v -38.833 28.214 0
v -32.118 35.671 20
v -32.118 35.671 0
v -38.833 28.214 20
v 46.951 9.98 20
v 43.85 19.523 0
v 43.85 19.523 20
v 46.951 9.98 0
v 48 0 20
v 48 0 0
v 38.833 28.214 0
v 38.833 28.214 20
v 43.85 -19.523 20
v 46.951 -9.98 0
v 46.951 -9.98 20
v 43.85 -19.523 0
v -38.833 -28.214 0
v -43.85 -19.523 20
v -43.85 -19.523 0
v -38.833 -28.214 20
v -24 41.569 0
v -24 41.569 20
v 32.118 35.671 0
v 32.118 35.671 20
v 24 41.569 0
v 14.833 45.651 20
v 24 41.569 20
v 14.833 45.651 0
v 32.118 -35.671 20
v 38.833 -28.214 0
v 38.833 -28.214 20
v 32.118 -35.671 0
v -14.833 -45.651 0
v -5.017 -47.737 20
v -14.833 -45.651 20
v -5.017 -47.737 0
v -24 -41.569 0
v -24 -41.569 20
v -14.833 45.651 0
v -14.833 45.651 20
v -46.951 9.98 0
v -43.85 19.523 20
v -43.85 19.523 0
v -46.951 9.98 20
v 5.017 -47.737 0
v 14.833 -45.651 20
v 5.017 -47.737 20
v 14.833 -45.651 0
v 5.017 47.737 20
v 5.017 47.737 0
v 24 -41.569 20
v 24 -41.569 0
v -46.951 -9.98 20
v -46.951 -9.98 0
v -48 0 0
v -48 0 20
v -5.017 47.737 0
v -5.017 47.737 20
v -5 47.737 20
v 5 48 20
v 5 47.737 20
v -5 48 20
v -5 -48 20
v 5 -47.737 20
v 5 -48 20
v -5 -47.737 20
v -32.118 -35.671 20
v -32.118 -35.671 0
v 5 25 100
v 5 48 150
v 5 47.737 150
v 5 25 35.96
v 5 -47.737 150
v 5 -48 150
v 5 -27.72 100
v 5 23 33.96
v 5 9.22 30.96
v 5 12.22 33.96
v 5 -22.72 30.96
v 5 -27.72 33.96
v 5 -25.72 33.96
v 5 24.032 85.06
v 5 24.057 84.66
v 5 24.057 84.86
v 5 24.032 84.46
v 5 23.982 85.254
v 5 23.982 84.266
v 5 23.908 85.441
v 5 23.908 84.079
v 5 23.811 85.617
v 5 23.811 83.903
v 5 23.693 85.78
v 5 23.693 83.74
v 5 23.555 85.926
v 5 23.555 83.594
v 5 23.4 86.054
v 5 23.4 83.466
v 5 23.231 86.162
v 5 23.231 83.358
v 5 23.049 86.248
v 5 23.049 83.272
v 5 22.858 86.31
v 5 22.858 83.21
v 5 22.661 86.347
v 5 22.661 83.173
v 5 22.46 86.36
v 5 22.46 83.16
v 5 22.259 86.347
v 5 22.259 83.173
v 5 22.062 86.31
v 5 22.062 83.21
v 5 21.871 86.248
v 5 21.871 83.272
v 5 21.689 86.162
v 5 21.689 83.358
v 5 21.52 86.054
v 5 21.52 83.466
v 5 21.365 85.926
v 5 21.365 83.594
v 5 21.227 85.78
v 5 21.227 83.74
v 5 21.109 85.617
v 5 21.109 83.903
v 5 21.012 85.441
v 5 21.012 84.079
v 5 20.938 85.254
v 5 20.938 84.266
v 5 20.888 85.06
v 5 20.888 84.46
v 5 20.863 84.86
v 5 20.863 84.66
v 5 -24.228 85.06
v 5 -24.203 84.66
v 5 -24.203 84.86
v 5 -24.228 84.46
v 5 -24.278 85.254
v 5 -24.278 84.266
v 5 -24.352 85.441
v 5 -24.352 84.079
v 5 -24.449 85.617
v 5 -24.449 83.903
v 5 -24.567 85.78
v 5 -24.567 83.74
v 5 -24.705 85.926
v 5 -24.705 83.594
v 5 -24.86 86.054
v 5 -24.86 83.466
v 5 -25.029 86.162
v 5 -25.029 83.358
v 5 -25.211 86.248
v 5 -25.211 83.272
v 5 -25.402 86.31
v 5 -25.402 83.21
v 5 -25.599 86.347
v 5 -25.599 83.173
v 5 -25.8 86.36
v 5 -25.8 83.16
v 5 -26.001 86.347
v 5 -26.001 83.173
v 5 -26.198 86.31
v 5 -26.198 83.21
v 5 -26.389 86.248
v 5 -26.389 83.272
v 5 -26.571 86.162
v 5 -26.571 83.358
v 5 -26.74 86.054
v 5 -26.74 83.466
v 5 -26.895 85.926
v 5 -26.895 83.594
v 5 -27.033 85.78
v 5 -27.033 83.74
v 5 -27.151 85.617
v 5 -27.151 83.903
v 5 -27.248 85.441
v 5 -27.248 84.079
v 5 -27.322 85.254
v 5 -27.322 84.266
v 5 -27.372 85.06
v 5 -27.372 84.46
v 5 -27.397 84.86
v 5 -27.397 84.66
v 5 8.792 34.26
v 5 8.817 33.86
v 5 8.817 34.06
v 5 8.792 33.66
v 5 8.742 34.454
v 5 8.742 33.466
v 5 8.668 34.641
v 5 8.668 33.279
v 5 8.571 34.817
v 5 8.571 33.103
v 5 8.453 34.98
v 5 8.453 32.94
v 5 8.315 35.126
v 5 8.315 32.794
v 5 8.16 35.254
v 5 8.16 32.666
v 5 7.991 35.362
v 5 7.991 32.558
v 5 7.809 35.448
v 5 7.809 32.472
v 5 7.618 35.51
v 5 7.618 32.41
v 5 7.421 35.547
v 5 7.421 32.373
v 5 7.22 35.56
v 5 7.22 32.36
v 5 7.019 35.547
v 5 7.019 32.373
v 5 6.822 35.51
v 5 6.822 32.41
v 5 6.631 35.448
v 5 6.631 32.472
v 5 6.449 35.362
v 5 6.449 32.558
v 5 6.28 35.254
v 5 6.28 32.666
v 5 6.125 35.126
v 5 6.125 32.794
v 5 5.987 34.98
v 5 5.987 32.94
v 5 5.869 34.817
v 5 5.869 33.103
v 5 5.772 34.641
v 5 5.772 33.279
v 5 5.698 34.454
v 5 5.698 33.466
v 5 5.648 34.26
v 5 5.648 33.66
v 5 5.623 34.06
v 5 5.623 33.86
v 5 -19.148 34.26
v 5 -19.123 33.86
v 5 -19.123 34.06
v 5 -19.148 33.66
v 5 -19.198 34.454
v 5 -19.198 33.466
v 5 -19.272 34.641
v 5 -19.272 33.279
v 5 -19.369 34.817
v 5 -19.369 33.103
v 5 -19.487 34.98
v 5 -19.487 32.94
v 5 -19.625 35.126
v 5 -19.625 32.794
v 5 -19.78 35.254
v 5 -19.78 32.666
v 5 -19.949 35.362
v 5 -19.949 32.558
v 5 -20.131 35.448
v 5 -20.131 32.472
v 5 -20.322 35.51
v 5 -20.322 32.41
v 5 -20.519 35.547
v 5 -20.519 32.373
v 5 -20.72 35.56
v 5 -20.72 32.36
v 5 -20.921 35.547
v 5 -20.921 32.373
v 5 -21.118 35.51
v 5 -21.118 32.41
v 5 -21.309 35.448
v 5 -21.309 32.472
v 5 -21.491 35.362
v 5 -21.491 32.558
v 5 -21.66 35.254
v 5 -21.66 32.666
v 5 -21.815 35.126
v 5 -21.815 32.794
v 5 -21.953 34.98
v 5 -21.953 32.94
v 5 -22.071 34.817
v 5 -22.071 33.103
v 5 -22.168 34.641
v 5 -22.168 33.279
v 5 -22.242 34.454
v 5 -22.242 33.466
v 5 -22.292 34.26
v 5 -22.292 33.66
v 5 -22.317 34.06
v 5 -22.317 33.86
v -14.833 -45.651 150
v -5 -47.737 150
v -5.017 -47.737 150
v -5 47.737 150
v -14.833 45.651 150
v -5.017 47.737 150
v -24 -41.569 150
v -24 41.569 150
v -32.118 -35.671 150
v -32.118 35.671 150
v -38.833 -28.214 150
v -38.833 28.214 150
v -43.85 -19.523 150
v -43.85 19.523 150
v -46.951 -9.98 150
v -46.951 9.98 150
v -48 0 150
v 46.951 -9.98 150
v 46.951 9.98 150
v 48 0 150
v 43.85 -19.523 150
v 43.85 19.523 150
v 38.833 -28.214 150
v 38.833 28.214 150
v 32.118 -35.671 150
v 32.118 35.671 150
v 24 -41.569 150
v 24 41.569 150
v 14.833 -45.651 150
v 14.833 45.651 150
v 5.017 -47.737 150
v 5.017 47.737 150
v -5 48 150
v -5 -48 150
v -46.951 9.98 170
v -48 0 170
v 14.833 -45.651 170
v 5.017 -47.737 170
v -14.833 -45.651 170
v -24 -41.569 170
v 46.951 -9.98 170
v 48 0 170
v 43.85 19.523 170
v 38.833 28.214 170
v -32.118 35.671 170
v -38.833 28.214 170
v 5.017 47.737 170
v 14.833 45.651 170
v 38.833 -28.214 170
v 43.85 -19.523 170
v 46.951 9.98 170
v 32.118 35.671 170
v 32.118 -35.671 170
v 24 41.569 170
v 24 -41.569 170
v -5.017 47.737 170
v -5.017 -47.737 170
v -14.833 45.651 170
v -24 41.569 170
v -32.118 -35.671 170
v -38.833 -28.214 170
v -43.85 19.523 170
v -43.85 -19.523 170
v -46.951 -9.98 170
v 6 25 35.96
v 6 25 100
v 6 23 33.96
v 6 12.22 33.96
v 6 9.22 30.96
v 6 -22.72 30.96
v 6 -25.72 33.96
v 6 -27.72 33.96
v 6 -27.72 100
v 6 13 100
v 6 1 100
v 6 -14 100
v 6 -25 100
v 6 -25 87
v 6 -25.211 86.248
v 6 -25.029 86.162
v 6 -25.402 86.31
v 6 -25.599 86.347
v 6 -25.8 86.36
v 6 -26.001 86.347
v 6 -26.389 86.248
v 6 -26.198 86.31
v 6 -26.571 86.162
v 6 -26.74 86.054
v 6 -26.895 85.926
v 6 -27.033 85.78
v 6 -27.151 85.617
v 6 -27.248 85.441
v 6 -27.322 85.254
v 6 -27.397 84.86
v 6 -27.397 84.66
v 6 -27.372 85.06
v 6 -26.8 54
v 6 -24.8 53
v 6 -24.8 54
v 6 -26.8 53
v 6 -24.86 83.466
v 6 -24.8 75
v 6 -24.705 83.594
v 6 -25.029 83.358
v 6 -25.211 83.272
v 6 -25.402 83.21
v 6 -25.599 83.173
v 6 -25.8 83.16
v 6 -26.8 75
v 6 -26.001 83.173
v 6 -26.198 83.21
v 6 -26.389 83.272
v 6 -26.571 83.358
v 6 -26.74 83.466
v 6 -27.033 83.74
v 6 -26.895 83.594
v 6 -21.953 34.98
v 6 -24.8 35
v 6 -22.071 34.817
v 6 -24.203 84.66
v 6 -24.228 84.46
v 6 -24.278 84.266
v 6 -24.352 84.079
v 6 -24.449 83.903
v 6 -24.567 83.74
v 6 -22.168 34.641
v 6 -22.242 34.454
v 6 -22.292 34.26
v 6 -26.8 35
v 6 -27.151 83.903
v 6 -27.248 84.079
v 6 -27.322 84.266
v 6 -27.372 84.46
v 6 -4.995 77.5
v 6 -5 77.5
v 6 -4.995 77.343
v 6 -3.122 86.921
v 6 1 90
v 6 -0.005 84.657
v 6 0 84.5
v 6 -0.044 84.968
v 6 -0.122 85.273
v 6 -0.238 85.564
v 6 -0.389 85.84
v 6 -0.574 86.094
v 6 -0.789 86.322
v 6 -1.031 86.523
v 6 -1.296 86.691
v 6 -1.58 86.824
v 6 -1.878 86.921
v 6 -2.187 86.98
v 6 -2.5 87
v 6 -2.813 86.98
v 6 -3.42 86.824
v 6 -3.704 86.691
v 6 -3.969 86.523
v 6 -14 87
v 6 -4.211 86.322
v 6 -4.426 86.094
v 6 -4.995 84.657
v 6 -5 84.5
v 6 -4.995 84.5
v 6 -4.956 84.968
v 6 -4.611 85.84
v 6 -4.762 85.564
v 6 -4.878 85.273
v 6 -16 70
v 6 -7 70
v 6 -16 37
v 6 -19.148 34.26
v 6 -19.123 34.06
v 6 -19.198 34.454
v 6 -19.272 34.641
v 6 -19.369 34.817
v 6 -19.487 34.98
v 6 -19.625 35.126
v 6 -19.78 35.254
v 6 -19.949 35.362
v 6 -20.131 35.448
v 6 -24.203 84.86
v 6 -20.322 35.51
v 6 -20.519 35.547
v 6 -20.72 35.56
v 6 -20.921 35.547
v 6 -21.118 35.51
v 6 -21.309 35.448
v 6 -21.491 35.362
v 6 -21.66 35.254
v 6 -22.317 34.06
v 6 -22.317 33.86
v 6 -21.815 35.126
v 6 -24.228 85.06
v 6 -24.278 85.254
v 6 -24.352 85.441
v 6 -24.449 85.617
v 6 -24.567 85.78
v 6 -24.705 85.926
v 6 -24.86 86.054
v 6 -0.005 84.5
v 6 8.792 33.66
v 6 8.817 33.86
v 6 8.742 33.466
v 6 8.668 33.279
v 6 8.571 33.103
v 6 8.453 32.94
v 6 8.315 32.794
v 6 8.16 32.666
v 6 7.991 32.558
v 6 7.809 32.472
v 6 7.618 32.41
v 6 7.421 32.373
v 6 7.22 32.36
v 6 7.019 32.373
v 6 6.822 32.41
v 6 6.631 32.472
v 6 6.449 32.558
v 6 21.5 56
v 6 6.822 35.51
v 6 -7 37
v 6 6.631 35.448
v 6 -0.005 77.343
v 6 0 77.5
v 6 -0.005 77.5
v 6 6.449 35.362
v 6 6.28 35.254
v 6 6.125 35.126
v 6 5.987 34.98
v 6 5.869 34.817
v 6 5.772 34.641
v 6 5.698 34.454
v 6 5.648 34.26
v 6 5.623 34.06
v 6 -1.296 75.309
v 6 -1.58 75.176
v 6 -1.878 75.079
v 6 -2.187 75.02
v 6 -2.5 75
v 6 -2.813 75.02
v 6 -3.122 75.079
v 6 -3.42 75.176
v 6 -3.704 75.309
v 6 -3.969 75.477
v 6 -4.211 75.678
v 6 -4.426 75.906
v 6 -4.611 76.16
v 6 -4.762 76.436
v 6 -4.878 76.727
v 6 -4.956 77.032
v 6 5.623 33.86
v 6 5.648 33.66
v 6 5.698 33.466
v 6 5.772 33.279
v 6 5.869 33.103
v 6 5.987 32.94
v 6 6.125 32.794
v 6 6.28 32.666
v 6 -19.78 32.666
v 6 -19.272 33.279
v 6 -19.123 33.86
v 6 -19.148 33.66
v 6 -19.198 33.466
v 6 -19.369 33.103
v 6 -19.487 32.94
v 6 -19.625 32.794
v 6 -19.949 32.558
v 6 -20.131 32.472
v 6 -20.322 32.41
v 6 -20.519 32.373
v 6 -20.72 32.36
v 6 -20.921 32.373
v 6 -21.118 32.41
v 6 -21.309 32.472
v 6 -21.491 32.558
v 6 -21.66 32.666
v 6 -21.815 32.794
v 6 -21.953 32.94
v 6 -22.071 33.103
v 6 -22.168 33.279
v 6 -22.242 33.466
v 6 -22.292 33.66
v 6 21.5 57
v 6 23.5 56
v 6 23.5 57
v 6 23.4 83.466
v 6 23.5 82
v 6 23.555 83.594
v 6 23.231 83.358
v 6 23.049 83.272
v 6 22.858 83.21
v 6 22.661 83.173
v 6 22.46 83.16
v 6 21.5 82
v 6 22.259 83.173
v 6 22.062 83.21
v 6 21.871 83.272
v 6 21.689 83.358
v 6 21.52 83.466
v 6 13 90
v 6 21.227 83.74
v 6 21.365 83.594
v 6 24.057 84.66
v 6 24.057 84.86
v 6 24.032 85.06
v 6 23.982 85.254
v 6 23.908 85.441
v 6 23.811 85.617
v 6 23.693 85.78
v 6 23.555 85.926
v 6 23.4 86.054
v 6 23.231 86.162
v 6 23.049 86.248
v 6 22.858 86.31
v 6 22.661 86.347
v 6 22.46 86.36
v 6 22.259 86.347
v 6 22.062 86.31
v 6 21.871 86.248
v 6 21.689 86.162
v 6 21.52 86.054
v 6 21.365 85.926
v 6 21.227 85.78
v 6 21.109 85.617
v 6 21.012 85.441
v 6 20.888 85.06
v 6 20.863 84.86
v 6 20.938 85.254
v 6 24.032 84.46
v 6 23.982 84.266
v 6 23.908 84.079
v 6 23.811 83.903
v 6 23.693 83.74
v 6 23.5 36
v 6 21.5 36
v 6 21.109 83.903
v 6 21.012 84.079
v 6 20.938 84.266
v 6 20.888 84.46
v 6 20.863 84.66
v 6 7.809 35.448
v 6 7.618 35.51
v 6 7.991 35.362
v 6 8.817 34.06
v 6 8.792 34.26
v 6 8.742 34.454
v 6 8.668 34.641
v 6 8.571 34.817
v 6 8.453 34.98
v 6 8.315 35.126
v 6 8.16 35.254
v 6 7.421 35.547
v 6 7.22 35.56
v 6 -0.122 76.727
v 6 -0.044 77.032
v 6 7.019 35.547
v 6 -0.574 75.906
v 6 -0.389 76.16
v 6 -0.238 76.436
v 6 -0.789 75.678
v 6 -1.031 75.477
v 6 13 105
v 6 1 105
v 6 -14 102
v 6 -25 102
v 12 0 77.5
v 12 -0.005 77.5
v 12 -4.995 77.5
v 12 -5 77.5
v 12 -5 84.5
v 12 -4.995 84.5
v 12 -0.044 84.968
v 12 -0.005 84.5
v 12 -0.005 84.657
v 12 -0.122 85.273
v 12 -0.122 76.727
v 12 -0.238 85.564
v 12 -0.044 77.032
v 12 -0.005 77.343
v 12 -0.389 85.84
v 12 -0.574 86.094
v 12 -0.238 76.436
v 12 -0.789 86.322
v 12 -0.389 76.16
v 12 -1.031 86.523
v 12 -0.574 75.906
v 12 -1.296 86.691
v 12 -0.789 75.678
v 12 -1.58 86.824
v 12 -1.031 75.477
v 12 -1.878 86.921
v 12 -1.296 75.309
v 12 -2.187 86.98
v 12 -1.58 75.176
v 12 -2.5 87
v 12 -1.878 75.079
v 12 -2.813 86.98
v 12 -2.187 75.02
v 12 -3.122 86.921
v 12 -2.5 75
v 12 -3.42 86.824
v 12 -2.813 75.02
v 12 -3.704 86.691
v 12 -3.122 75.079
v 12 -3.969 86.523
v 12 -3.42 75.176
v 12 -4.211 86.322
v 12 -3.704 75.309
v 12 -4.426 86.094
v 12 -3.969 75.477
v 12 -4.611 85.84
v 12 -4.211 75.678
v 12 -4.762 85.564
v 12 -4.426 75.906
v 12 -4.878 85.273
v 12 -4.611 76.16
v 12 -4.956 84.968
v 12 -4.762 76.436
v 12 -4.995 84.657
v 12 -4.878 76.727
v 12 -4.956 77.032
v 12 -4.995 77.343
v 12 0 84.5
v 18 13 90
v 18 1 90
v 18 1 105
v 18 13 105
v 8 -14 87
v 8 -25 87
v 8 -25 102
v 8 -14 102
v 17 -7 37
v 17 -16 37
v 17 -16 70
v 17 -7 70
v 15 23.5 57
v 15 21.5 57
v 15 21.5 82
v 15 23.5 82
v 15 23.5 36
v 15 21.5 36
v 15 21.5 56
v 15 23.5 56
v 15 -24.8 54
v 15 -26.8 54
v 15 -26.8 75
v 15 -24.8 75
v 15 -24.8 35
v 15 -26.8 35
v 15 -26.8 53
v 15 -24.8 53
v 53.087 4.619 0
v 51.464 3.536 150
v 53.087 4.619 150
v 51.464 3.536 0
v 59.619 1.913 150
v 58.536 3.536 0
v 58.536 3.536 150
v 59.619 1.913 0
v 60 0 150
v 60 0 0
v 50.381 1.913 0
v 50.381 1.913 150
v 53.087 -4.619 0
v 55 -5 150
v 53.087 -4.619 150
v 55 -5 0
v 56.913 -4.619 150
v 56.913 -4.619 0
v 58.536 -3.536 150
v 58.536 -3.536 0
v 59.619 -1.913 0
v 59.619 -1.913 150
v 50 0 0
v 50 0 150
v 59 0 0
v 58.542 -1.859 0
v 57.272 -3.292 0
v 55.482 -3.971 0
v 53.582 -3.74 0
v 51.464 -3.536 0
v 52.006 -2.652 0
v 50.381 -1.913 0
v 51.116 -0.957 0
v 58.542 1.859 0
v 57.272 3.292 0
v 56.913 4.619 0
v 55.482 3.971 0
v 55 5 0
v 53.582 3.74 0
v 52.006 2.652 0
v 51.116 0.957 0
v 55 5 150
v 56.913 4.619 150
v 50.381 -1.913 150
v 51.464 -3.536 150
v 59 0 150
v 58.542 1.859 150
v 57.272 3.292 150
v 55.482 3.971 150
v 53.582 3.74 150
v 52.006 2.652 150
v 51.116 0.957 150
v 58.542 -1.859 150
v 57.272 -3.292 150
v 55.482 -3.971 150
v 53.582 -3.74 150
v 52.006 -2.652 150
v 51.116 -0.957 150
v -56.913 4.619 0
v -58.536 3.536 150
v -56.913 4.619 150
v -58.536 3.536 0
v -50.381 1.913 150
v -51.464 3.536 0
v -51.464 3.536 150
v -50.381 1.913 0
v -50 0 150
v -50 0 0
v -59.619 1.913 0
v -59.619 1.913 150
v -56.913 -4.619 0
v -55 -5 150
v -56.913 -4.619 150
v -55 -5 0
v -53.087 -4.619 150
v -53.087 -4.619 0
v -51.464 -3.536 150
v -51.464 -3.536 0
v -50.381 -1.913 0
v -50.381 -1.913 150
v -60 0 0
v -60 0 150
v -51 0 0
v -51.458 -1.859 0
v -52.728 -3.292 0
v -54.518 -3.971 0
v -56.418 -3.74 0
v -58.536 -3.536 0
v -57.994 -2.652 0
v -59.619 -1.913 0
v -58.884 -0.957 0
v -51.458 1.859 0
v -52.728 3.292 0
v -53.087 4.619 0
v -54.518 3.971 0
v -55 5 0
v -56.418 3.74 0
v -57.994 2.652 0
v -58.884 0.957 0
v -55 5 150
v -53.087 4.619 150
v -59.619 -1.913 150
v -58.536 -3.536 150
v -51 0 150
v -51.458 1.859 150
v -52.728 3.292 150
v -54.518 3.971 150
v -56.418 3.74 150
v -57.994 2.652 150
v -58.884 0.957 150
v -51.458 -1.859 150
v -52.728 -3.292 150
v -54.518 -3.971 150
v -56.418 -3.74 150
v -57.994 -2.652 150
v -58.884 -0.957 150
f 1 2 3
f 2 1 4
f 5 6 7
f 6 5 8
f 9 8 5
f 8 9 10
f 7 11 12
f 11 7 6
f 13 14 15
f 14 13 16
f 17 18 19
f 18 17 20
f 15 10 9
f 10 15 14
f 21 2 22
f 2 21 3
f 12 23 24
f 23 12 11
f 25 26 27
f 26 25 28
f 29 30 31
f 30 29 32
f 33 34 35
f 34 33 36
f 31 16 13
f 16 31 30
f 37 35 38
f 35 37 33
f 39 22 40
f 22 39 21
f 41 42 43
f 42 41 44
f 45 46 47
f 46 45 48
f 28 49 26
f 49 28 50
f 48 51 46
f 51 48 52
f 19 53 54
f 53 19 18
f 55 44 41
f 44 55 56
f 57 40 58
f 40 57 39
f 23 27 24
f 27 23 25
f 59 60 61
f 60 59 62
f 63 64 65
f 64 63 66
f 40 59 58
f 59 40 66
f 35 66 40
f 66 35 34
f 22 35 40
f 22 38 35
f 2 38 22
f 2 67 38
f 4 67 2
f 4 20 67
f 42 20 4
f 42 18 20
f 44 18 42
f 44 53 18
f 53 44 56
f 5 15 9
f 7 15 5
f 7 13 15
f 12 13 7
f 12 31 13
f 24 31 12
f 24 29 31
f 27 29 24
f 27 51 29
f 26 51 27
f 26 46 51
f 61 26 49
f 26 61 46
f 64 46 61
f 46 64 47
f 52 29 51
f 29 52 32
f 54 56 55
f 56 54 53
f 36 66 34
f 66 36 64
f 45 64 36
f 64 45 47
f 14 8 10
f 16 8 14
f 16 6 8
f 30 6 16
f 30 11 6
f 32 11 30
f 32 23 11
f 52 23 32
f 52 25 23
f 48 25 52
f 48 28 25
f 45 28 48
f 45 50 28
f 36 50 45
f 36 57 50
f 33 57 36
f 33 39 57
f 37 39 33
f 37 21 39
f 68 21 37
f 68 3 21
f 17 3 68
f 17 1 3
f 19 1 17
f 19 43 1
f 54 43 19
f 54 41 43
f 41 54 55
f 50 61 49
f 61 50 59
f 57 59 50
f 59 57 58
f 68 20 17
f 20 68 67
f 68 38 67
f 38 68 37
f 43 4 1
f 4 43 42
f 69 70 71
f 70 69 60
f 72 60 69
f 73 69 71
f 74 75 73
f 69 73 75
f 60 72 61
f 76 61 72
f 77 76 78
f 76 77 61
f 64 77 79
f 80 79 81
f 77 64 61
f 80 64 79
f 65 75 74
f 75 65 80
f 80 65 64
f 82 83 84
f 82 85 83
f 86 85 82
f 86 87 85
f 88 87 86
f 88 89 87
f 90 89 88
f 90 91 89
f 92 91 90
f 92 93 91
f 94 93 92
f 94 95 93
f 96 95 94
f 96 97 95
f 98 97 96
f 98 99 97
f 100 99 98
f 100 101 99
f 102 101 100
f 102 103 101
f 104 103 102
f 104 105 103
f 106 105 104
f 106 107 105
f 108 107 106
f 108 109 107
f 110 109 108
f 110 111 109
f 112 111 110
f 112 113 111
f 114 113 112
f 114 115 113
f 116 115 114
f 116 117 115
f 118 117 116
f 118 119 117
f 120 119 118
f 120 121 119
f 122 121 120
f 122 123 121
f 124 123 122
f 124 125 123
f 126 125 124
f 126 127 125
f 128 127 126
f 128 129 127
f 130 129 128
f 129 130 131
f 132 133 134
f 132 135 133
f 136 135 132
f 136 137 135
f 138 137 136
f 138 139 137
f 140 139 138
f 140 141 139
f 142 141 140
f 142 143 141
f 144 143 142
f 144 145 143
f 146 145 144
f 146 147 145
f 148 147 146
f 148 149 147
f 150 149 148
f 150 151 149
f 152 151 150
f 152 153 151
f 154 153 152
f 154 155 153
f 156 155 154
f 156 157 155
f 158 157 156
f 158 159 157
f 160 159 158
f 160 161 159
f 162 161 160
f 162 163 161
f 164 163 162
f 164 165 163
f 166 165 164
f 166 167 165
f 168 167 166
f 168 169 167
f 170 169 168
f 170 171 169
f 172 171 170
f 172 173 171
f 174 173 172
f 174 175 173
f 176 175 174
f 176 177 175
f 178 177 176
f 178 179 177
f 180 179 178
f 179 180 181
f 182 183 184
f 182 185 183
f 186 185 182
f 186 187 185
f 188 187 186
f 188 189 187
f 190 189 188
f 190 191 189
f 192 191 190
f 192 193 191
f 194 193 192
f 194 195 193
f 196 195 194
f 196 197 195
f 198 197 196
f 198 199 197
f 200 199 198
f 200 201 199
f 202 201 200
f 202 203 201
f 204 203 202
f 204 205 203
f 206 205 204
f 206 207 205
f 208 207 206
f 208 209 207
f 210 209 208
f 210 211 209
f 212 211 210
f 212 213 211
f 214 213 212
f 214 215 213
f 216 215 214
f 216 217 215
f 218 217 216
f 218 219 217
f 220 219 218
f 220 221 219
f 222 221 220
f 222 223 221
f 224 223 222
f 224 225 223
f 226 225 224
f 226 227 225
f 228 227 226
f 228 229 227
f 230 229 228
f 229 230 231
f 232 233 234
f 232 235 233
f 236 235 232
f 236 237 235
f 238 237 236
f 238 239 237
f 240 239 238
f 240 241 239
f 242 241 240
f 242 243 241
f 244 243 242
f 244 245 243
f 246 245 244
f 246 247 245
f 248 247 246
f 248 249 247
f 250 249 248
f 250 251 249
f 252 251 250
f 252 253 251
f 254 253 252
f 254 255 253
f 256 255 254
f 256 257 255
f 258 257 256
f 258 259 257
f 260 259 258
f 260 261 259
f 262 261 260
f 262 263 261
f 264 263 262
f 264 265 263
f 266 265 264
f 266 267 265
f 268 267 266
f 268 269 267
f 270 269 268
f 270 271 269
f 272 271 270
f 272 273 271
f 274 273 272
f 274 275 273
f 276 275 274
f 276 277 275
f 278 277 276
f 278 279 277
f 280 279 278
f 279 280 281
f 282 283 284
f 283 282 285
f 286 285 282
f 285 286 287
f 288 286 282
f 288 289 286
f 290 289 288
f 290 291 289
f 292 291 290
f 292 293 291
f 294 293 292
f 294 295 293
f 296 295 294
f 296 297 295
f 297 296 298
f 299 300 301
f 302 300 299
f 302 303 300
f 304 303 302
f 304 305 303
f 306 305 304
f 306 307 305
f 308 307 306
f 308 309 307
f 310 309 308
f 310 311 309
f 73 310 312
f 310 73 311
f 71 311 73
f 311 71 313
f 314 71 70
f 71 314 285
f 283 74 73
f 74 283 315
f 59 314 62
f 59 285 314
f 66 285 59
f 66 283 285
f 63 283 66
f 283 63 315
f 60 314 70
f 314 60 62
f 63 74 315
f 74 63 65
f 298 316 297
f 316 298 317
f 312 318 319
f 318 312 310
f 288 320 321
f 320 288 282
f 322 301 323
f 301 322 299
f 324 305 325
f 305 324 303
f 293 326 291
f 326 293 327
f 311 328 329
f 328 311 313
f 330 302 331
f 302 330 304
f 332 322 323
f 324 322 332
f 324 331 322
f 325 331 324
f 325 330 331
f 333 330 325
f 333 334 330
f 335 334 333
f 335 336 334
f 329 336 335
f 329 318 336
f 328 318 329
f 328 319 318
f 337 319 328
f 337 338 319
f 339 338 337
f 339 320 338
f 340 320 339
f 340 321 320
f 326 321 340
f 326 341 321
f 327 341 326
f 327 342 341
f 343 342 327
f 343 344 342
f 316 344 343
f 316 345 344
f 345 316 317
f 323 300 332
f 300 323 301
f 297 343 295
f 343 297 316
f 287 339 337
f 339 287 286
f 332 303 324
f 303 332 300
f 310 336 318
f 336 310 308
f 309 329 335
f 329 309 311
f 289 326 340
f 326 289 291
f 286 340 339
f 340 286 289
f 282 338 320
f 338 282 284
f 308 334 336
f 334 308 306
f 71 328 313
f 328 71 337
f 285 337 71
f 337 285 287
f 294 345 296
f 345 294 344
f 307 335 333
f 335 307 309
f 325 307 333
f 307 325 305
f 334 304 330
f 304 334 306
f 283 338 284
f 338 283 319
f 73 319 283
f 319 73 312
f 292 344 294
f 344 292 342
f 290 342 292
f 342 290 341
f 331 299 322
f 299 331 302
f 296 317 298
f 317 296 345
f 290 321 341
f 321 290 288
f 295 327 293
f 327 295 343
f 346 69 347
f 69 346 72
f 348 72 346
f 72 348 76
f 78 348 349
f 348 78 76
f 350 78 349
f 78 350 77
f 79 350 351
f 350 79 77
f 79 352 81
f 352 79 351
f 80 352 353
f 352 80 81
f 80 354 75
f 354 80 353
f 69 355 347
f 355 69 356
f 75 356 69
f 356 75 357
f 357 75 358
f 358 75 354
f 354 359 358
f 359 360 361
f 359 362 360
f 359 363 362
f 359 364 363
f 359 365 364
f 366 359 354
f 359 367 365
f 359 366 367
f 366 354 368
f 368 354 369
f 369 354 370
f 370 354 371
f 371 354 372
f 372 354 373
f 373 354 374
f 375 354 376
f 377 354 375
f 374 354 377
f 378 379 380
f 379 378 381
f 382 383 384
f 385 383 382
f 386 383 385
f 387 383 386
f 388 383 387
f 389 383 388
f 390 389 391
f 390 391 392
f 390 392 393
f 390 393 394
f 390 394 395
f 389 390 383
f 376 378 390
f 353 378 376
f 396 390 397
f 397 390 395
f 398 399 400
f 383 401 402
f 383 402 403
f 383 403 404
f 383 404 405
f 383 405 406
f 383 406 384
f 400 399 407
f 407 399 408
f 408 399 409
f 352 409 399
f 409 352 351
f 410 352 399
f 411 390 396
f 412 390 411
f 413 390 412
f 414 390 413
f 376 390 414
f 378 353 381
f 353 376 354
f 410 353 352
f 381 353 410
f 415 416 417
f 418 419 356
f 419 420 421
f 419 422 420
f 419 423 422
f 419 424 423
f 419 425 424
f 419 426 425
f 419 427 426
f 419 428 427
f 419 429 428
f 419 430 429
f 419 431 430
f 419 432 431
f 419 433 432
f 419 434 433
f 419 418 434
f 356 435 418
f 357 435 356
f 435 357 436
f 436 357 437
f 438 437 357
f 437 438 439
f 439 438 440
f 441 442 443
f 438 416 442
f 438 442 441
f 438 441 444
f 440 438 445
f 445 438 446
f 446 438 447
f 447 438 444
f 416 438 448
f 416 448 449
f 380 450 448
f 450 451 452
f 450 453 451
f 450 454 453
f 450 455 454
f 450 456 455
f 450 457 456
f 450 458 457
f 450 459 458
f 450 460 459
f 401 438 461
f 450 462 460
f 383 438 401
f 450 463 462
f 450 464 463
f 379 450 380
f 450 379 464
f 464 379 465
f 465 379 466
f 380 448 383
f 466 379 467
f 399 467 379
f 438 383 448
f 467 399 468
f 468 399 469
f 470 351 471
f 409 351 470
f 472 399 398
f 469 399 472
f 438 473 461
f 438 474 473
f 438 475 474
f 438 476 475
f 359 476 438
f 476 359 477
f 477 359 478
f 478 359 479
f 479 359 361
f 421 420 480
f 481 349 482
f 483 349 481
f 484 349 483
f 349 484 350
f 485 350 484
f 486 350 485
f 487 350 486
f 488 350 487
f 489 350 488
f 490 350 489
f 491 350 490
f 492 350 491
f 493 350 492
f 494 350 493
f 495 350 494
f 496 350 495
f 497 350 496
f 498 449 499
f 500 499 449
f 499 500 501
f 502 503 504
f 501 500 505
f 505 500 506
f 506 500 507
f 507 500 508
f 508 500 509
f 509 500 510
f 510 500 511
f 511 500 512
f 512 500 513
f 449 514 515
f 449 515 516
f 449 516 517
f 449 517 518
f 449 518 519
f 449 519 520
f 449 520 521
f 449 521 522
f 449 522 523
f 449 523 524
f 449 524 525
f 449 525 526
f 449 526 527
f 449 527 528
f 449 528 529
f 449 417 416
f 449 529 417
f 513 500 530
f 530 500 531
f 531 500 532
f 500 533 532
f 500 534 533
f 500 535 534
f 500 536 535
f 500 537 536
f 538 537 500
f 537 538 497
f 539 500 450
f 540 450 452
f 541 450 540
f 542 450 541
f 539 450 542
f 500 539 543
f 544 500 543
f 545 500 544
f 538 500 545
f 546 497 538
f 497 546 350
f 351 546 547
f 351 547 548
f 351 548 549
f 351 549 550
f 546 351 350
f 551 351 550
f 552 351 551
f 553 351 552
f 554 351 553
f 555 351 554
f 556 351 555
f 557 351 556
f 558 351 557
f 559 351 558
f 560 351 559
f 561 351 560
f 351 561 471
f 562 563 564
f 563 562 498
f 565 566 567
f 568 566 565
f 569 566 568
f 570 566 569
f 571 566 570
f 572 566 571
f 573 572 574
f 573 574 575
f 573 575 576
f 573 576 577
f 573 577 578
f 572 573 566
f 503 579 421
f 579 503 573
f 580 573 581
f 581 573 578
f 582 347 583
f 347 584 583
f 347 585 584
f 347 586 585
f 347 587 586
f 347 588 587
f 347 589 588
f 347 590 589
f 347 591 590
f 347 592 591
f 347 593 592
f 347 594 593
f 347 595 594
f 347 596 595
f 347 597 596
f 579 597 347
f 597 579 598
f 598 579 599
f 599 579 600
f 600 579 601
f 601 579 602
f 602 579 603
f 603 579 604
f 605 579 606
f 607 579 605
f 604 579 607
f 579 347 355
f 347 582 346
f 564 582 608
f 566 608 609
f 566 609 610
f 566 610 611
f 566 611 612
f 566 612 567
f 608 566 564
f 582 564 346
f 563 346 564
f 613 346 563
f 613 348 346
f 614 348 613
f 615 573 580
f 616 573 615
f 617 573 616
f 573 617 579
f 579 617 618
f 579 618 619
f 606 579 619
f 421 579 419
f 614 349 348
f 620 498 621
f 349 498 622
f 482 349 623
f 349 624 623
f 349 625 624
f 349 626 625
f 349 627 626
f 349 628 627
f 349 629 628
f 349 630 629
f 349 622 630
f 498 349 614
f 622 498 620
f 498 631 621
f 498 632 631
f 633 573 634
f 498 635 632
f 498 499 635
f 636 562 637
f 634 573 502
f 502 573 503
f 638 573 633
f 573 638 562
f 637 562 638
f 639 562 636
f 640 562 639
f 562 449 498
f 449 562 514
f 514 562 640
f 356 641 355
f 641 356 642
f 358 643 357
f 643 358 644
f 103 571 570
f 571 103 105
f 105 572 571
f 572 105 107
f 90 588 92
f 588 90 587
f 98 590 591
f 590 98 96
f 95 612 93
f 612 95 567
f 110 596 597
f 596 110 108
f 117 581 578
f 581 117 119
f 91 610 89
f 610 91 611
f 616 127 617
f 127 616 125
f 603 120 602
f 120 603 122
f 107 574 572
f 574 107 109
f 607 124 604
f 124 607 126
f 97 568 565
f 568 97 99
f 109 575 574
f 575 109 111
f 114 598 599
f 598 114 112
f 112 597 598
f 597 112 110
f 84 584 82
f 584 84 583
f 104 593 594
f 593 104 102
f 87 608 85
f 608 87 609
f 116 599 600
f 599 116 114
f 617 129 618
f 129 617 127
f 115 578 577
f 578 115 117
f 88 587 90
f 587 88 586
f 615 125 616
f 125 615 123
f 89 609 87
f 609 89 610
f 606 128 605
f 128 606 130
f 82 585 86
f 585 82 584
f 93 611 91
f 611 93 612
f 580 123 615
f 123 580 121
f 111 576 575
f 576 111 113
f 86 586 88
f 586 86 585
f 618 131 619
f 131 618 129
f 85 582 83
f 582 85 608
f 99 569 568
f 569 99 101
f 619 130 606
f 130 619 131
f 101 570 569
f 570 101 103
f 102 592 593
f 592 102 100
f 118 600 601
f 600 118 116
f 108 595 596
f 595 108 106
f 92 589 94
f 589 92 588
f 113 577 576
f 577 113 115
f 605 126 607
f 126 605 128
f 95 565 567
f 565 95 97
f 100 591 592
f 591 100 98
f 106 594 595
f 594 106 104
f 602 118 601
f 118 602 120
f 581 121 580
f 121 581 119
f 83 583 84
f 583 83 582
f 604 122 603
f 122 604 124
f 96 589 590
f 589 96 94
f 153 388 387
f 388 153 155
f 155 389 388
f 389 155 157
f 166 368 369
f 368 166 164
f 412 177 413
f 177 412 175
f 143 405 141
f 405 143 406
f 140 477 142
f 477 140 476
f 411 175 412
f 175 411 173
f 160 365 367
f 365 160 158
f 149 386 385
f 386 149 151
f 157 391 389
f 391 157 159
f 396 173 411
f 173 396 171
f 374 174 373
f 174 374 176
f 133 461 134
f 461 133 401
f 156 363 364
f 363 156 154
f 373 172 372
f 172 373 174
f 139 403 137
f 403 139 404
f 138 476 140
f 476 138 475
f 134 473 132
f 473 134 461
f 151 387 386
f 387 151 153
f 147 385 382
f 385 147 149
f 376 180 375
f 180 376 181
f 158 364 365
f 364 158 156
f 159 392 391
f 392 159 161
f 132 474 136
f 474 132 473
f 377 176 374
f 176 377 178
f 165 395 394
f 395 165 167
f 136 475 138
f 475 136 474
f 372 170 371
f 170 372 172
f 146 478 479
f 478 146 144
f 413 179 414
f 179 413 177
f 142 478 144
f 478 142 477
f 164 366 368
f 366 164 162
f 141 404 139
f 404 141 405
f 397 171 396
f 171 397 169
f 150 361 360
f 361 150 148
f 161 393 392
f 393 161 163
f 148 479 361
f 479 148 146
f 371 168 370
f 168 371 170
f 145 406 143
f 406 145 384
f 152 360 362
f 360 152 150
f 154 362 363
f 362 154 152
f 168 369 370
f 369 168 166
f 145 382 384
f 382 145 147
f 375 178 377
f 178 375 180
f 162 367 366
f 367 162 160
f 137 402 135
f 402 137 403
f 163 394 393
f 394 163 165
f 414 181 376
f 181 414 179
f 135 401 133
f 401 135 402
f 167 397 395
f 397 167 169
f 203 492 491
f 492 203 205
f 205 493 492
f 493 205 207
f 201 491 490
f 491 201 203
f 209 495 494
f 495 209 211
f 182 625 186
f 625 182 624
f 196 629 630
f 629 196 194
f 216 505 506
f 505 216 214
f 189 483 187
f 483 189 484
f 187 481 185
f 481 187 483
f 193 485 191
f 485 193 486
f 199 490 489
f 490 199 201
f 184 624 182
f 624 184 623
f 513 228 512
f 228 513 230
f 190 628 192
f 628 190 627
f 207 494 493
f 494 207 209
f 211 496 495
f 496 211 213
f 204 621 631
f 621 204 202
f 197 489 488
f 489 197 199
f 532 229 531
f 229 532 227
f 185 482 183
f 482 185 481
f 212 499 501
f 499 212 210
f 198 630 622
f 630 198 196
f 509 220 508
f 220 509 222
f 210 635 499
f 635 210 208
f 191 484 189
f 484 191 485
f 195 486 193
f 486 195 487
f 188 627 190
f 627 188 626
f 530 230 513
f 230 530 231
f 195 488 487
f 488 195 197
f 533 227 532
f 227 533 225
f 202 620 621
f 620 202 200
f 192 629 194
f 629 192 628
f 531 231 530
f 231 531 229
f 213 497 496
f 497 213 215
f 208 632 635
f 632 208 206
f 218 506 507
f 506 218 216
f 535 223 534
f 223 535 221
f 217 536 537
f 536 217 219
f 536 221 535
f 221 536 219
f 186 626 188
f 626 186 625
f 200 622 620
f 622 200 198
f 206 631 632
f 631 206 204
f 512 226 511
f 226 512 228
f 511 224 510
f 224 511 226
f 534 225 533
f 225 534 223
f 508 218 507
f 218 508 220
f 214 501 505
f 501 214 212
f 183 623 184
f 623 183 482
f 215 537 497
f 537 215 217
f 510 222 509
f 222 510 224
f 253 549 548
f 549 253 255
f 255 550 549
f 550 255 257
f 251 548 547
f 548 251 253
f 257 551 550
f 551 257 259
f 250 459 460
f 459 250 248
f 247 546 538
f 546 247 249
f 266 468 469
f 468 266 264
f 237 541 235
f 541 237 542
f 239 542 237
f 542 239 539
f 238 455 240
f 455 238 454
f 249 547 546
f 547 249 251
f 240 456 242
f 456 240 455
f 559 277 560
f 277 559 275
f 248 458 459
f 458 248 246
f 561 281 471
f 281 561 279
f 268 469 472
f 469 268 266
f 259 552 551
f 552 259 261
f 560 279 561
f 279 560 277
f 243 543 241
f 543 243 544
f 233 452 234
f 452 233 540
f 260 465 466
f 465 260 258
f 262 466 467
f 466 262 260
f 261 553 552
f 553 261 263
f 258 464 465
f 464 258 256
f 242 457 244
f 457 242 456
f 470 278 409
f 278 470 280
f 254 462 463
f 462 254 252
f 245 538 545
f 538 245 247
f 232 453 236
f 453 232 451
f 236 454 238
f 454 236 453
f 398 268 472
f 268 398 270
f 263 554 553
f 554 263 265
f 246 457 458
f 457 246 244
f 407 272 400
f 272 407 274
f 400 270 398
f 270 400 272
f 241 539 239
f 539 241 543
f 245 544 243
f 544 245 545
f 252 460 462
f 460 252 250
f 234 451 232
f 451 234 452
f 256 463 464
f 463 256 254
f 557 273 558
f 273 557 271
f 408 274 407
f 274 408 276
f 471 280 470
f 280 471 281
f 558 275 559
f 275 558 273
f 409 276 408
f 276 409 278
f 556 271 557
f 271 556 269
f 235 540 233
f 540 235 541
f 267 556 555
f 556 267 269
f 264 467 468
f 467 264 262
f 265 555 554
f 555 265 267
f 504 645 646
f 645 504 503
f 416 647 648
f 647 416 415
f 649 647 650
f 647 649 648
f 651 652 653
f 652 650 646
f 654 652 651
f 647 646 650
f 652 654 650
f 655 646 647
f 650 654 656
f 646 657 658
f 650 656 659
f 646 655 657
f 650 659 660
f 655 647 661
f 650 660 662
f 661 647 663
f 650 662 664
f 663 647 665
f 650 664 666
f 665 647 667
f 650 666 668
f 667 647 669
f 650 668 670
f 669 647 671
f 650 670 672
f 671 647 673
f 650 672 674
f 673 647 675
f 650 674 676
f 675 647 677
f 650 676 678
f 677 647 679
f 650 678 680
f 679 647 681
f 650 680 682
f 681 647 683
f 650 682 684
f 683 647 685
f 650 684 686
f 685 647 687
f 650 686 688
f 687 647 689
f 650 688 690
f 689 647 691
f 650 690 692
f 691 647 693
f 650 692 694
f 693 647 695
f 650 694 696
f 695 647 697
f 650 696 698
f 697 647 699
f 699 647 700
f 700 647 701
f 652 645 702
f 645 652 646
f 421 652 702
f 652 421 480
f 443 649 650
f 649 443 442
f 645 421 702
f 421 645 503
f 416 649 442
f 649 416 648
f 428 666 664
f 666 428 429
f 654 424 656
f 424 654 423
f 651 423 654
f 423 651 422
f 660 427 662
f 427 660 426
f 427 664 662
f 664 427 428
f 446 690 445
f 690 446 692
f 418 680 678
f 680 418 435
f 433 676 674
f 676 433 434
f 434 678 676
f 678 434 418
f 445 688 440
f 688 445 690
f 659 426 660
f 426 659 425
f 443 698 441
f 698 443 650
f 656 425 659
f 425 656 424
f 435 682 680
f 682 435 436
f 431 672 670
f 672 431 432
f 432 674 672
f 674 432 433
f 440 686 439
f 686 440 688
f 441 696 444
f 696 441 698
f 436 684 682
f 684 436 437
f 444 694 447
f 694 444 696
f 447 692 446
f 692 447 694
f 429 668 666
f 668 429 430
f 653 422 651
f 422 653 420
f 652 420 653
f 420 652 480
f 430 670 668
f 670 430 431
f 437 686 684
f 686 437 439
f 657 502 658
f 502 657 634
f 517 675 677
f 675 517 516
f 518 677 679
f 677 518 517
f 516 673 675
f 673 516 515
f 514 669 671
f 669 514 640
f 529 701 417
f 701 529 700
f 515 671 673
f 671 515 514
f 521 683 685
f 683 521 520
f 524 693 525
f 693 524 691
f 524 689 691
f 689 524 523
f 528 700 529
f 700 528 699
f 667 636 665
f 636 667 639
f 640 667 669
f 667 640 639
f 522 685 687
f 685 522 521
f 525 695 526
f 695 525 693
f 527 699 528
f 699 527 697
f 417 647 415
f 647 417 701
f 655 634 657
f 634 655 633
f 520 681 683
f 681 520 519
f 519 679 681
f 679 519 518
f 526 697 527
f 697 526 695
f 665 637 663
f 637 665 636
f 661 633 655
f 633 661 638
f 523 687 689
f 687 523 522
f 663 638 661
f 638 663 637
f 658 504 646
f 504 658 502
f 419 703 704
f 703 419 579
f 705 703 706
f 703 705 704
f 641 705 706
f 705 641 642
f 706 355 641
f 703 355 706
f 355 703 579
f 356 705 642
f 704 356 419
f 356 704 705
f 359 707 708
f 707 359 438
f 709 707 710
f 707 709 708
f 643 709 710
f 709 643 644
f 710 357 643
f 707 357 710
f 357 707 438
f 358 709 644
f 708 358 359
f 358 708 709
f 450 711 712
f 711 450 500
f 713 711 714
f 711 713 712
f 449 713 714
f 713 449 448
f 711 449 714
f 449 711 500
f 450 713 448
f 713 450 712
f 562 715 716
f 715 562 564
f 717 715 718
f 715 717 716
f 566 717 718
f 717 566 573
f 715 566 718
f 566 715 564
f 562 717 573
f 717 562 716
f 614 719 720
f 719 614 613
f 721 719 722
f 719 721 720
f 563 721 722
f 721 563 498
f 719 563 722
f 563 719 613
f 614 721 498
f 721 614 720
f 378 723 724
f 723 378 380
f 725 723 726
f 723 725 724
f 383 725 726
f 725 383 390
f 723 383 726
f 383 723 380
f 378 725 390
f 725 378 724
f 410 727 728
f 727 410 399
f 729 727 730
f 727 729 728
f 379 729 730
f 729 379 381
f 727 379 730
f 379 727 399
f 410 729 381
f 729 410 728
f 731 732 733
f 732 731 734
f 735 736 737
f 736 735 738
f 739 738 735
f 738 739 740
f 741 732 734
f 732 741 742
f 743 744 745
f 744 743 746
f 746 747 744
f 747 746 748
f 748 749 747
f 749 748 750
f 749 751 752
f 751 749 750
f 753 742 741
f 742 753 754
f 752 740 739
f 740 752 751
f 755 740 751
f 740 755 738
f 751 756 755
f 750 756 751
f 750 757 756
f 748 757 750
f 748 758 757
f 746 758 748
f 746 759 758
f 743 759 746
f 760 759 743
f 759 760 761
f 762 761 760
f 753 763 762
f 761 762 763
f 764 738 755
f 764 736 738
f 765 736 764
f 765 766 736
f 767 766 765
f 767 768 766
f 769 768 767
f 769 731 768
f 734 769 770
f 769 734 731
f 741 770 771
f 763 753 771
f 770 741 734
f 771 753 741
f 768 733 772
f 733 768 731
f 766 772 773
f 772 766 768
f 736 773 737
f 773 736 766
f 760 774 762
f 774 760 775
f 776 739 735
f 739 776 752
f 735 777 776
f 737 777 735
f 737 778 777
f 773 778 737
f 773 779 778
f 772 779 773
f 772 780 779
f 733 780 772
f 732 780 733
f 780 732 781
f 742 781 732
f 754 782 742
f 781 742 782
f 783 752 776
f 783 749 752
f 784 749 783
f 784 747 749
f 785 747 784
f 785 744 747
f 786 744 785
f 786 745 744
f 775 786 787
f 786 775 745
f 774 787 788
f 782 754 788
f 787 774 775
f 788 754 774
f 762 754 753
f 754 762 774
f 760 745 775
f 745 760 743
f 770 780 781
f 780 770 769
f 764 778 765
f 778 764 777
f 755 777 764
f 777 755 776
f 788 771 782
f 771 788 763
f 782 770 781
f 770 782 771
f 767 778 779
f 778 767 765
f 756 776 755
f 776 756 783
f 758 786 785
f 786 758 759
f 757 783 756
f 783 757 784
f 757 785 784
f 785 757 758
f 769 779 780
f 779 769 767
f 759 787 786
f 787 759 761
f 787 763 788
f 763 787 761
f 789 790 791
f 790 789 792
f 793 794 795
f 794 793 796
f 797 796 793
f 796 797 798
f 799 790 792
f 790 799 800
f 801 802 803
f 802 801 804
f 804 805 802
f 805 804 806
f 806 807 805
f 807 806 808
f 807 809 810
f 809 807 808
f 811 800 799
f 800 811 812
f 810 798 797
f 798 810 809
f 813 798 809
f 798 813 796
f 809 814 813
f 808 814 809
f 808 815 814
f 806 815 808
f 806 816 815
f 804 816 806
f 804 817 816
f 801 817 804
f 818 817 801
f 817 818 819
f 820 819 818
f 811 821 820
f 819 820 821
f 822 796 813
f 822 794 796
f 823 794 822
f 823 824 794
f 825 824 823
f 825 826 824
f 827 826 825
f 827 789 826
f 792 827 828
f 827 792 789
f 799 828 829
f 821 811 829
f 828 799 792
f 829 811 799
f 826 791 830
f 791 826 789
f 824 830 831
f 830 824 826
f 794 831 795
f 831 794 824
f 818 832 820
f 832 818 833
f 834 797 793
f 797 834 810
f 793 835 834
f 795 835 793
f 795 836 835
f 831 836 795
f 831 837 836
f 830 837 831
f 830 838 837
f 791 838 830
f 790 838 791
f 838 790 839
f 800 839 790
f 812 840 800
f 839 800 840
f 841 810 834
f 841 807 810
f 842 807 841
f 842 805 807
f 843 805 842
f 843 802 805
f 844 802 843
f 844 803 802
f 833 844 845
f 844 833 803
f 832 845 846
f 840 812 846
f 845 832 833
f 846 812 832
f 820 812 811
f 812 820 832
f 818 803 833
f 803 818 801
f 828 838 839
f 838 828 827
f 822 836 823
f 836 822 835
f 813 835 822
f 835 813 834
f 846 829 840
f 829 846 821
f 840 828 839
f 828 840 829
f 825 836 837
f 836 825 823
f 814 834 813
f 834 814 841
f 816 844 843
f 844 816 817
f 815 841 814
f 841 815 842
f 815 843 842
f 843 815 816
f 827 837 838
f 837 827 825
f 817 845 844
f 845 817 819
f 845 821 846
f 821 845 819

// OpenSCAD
// file: ../library/elec-comps/elec-comps.scad
use <../meca-comps/meca-comps.scad>

// <img src="file:///G:/Mon%20Drive/Cspace%202023%20-%20Karlavagnen/Mod%C3%A9lisation%203D/library/elec-comps/diode.png">

module diode(d=5) {
    translate([0,0,d]) 
    sphere(d=d, $fn=100);
    cylinder(d=d,h=d, $fn=100);
}

// <img src="file:///G:/Mon%20Drive/Cspace%202023%20-%20Karlavagnen/Mod%C3%A9lisation%203D/library/elec-comps/interrupteur.png">

module interrupteur(state="ON"){
    largeure  = 8;
    longueure = 14;
    hauteur   = 10;
    translate([0,0,5])
    union() {
        color("blue")
        cube(size=[largeure, longueure, hauteur], center=true);
        
        color("grey")
        translate([0, 0, hauteur/2-0.1]) 
        cube(size=[largeure+0.2, longueure+0.2, 0.4], center=true);
        
        color("grey")
        translate([0, 0, 2.6])
        cube(size=[largeure+0.2, longueure-1, 5], center=true);
        
        color("grey")
        translate([0,0,5]) 
        cylinder(d=4,h=1,$fn=30);
        
        translate([0,0,5])
        if (state=="ON"){
            rotate([30,0,0])
            union() {
                hauteur=6;
                diametre=2.5;
                color("grey")
                cylinder(d=diametre,h=hauteur,$fn=30);
                color("grey")
                translate([0,0,hauteur]) 
                sphere(d=diametre,$fn=30);
            }
        }else{
            rotate([-30,0,0])
            union() {
                hauteur=6;
                diametre=2.5;
                color("grey")
                cylinder(d=diametre,h=hauteur,$fn=30);
                color("grey")
                translate([0,0,hauteur]) 
                sphere(d=diametre,$fn=30);
            }
        }
    }
}

// <img src="file:///G:/Mon%20Drive/Cspace%202023%20-%20Karlavagnen/Mod%C3%A9lisation%203D/library/elec-comps/moteur.png">

module moteur_1(){
    for (i=[0:1:1]) {
        color("grey")
        rotate([0,0,i*180]) 
        translate([28/2-1.5, -1, 35+25+3])
        rotate([0,-45,0]) 
        cube(size=[0.1,2,4]);
    }
    
    translate([0, 0, 35+25+3])
    union(){
        color(c=[0.2,0.2,0.2,1])
        bague_creuse(10, 2, 2);
        color("grey")
        cylinder(d=2, h=2);
    }
    
    color(c=[0.2,0.2,0.2,1])
    translate([0, 0, 35+25])
    cylinder(d=28, h=3);
    
    color("DarkKhaki")
    translate([0, 0, 25])
    cylinder(d=28, h=35);
    
    color("Gray")
    translate([0, 0, 0])
    cylinder(d=32, h=25);
    
    rotate([0,0,90]) 
    translate([32/2-5-10/2, 0, -2])
    union() {
        color("Gray")
        cylinder(d=10, h=2);
        color("lightGray")
        translate([0,0,-10])
        difference(){
            cylinder(d=5, h=10);
            translate([0,5/2,2]) 
            cube(size=[6,5,12], center=true);
        }
    }
}

// <img src="file:///G:/Mon%20Drive/Cspace%202023%20-%20Karlavagnen/Mod%C3%A9lisation%203D/library/elec-comps/pile_9V.png">

module pile_9V(){
    l = 25;
    L = 45;
    e = 17;
    
    color([0.1,0.1,0.1])
    translate([2,2,0])
    minkowski(){
        cube(size=[l-4,e-4,L*2/3-2]);
        cylinder(h=2, r=2, $fn=50);
    }
    color("darkOrange")
    translate([2,2,L*2/3])
    minkowski(){
        cube(size=[l-4,e-4,L*1/3-2]);
        cylinder(h=2, r=2, $fn=50);
    }
    
    color("grey")
    translate([7,e/2,L])
    cylinder(d=5, h=2, $fn=50);

    color("grey")
    translate([18,e/2,L])
    cylinder(d=8, h=2, $fn=50);
}
// file: ../library/meca-comps/meca-comps.scad
// <img src="file:///G:/Mon%20Drive/Cspace%202023%20-%20Karlavagnen/Mod%C3%A9lisation%203D/library/meca-comps/aileron.png">

module aileron(m, n, E, p, epaisseur) {
    CubePoints = [
        [  0,       0,         0 ], //0
        [  E, m-(p+n),         0 ], //1
        [  E,     m-p,         0 ], //2
        [  0,       m,         0 ], //3
        [  0,       0, epaisseur ], //4
        [  E, m-(p+n), epaisseur ], //5
        [  E,     m-p, epaisseur ], //6
        [  0,       m, epaisseur ]  //7
    ];
    
    CubeFaces = [
        [0,1,2,3], // bottom
        [4,5,1,0], // front
        [7,6,5,4], // top
        [5,6,2,1], // right
        [6,7,3,2], // back
        [7,4,0,3]  // left
    ];
    
    translate([0,epaisseur/2,0]) rotate(a=[90,0,0]) color("grey") polyhedron( CubePoints, CubeFaces );
}

// <img src="file:///G:/Mon%20Drive/Cspace%202023%20-%20Karlavagnen/Mod%C3%A9lisation%203D/library/meca-comps/bague_creuse.png">

module bague_creuse(diametre_externe, diametre_interieur, epaisseur) {
    assert(diametre_externe > diametre_interieur, "Le diametre extérieur doit être plus grand que diametre intérieur")
    difference() {
        cylinder(h=epaisseur, d=diametre_externe);
        translate([0,0,-1]) cylinder(h=epaisseur+2, d=diametre_interieur);
    }
}

// <img src="file:///G:/Mon%20Drive/Cspace%202023%20-%20Karlavagnen/Mod%C3%A9lisation%203D/library/meca-comps/bague_de_poussee.png">

module bague_de_poussee(
    diametre_exterieur,
    diametre_intermediaire,
    diametre_interieur,
    epaisseur_exterieure,
    epaisseur_interieure
) {
    union() {
        bague_creuse(diametre_exterieur, diametre_interieur, epaisseur_exterieure, $fn=50);
        bague_creuse(diametre_intermediaire, diametre_interieur, epaisseur_interieure, $fn=50);
    }
}

// <img src="file:///G:/Mon%20Drive/Cspace%202023%20-%20Karlavagnen/Mod%C3%A9lisation%203D/library/meca-comps/bague_pleine.png">

module bague_pleine(diametre, epaisseur) {
    cylinder(h=epaisseur, d=diametre);
}

// <img src="file:///G:/Mon%20Drive/Cspace%202023%20-%20Karlavagnen/Mod%C3%A9lisation%203D/library/meca-comps/equerre.png">

module equerre(h1, h2, l, e){
    union() {
        cube(size=[h1,e,l]);
        cube(size=[e,h2,l]);
    }
}

// <img src="file:///G:/Mon%20Drive/Cspace%202023%20-%20Karlavagnen/Mod%C3%A9lisation%203D/library/meca-comps/guide_rampe.png">

module guide_rampe() {
    rotate([-90,0,0]) color("grey") union() {
        cylinder(d= 7, h=13);
        cylinder(d=12, h= 5);
        translate([0,0,10]) cylinder(d=12, h=3);
    }
}

// <img src="file:///G:/Mon%20Drive/Cspace%202023%20-%20Karlavagnen/Mod%C3%A9lisation%203D/library/meca-comps/ogive.png">

module ogive(hauteur, diametre, epaisseur) {
    difference() {
        ogive_pleine(hauteur, diametre);
        translate([0,0,-1 ]) ogive_pleine(hauteur-epaisseur+1, diametre-epaisseur);
    }
}

// <img src="file:///G:/Mon%20Drive/Cspace%202023%20-%20Karlavagnen/Mod%C3%A9lisation%203D/library/meca-comps/ogive_pleine.png">

module ogive_pleine(hauteur, diametre) {
    h_o = hauteur;
    d_o = diametre;
    r_o = d_o/2;

    rotate_extrude(angle=360, convexity=2)
    rotate(a=[0,0,90]) 
    intersection() {
        square([h_o,r_o]);
        resize([2*h_o, 0, 0]) circle(r_o, $fn=100);
    }
}

// <img src="file:///G:/Mon%20Drive/Cspace%202023%20-%20Karlavagnen/Mod%C3%A9lisation%203D/library/meca-comps/ressort.png">

module ressort(diametre=10, section=1, hauteur=20, nb_spire=10){
    //
    // Mendel90
    //
    // GNU GPL v2
    // nop.head@gmail.com
    // hydraraptor.blogspot.com
    //
    // Springs
    //

    extruder_spring = [ 7,    1, 10, 5];
    hob_spring      = [12, 0.75, 10, 6];

    function spring_od(type)     = type[0];
    function spring_gauge(type)  = type[1];
    function spring_length(type) = type[2];
    function spring_coils(type)  = type[3];

    // taken from openscad example 20
    module coil(r1 = 100, r2 = 10, h = 100, twists)
    {
        hr = h / (twists * 2);
        stepsize = 1/16;
        module segment(i1, i2) {
            alpha1 = i1 * 360*r2/hr;
            alpha2 = i2 * 360*r2/hr;
            len1 = sin(acos(i1*2-1))*r2;
            len2 = sin(acos(i2*2-1))*r2;
            if (len1 < 0.01)
                polygon([
                    [ cos(alpha1)*r1, sin(alpha1)*r1 ],
                    [ cos(alpha2)*(r1-len2), sin(alpha2)*(r1-len2) ],
                    [ cos(alpha2)*(r1+len2), sin(alpha2)*(r1+len2) ]
                ]);
            if (len2 < 0.01)
                polygon([
                    [ cos(alpha1)*(r1+len1), sin(alpha1)*(r1+len1) ],
                    [ cos(alpha1)*(r1-len1), sin(alpha1)*(r1-len1) ],
                    [ cos(alpha2)*r1, sin(alpha2)*r1 ],
                ]);
            if (len1 >= 0.01 && len2 >= 0.01)
                polygon([
                    [ cos(alpha1)*(r1+len1), sin(alpha1)*(r1+len1) ],
                    [ cos(alpha1)*(r1-len1), sin(alpha1)*(r1-len1) ],
                    [ cos(alpha2)*(r1-len2), sin(alpha2)*(r1-len2) ],
                    [ cos(alpha2)*(r1+len2), sin(alpha2)*(r1+len2) ]
                ]);
        }
        linear_extrude(height = h, twist = 180*h/hr,
                $fn = (hr/r2)/stepsize, convexity = 5) {
            for (i = [ stepsize : stepsize : 1+stepsize/2 ])
                segment(i-stepsize, min(i, 1));
        }
    }

    module comp_spring(type, l = 0) {
        l = (l == 0) ? spring_length(type) : l;

        coil(r1 = (spring_od(type) - spring_gauge(type)) / 2, r2 = spring_gauge(type) / 2, h = l, twists = spring_coils(type));

        if($children)
            translate([0, 0, l])
                children();
    }
    
    color("grey")
    comp_spring([diametre, section, hauteur, nb_spire]);
}

// <img src="file:///G:/Mon%20Drive/Cspace%202023%20-%20Karlavagnen/Mod%C3%A9lisation%203D/library/meca-comps/tube.png">

module tube(hauteur, diametre, epaisseur) {
    difference() {
        cylinder(h=hauteur, d=diametre);
        translate([0,0,-1]) cylinder(h=hauteur+2, d=diametre-epaisseur*2);
    }
}
// file: ../library/elec-cartes/elec-cartes.scad
use <../elec-comps/elec-comps.scad>
use <../meca-comps/meca-comps.scad>

// <img src="file:///G:/Mon%20Drive/Cspace%202023%20-%20Karlavagnen/Mod%C3%A9lisation%203D/library/elec-cartes/arduino_uno.png">

module arduino_uno(){
    color("blue")
    difference() {
        polyhedron(
            points=[
                [    0  ,               0, 0], //  0
                [66.04-2,               0, 0], //  1
                [66.04  ,              -2, 0], //  2
                [66.04  ,    -(17.78-2-3), 0], //  3
                [69.04  ,    -(17.78-2  ), 0], //  4
                [66.04+3,  -(45.72+2    ), 0], //  5
                [66.04  ,  -(45.72+2+3  ), 0], //  6
                [66.04  ,  -(45.72+2+3+2), 0], //  7
                [    0  ,  -(45.72+2+3+2), 0], //  8

                [    0  ,               0, 1], //  9
                [66.04-2,               0, 1], // 10
                [66.04  ,              -2, 1], // 11
                [66.04  ,    -(17.78-2-3), 1], // 12
                [69.04  ,    -(17.78-2  ), 1], // 13
                [66.04+3,  -(45.72+2    ), 1], // 14
                [66.04  ,  -(45.72+2+3  ), 1], // 15
                [66.04  ,  -(45.72+2+3+2), 1], // 16
                [    0  ,  -(45.72+2+3+2), 1], // 17
            ],
            faces=[
                [9,0,1,10],
                [10,1,2,11],
                [11,2,3,12],
                [12,3,4,13],
                [13,4,5,14],
                [14,5,6,15],
                [15,6,7,16],
                [16,7,8,17],
                [17,8,0,9],
                [9,10,11,12,13,14,15,16,17],
                [0,8,7,6,5,4,3,2,1]
            ],
            convexity=5
        );
        translate([15.24, -2.54,-1]) cylinder(d=3.2, h=10, $fn=50);
        translate([15.24,-50.8 ,-1]) cylinder(d=3.2, h=10, $fn=50);
        translate([66.04,-17.78,-1]) cylinder(d=3.2, h=10, $fn=50);
        translate([66.04,-45.72,-1]) cylinder(d=3.2, h=10, $fn=50);
    }
    // USB
    color("grey")
    translate([-5,-12*2,1])
    cube(size=[15, 12, 12]);
    // SD
    color("grey")
    translate([-2,-(50),1])
    cube(size=[15, 11, 2]);
    // Crystal
    color("grey")
    translate([13,-30,1])
    union() {
        longueur = 12;
        largeur  = 5;
        hauteur  = 6;
        translate([largeur/2,0,0]) cube(size=[longueur-largeur,largeur,hauteur]);
        translate([largeur/2,largeur/2,0]) cylinder(d=largeur,h=hauteur, $fn=50);
        translate([longueur-largeur/2,largeur/2,0]) cylinder(d=largeur,h=hauteur, $fn=50);
    }
    // ATMega
    color([0.1,0.1,0.1])
    translate([30,-41,0]) 
    cube(size=[33,9,12]);

    // Pins
    color([0.1,0.1,0.1])
    translate([18,-3.5,0])
    cube(size=[25,2,10]);

    color([0.1,0.1,0.1])
    translate([44,-3.5,0])
    cube(size=[20,2,10]);

    color([0.1,0.1,0.1])
    translate([25,-51.8,0])
    cube(size=[21,2,10]);

    color([0.1,0.1,0.1])
    translate([47,-51.8,0])
    cube(size=[18,2,10]);
}

// <img src="file:///G:/Mon%20Drive/Cspace%202023%20-%20Karlavagnen/Mod%C3%A9lisation%203D/library/elec-cartes/sequenceur.png">

module sequenceur(){
    epaisseur_carte = 1.5;
    // Carte
    color("beige")
    translate([0,0,epaisseur_carte/2]) 
    cube(size=[85,50,epaisseur_carte], center=true);
    // Relay
    color("white")
    translate([-35,-20,epaisseur_carte])
    cube([20, 15, 15]);
    // diode 1
    color("red")
    translate([-35,15,epaisseur_carte]) 
    diode();
    // diode 2
    color("blue")
    translate([-28,15,epaisseur_carte]) 
    diode();
    // Condo 1
    color("blue")
    translate([7,15,epaisseur_carte]) 
    cylinder(d=10, h=13, $fn=20);
    // Condo 2
    color("blue")
    translate([25,5,epaisseur_carte]) 
    cylinder(d=5, h=8, $fn=20);
    // Transistor
    color([0.1,0.1,0.1])
    translate([-16,1,epaisseur_carte]) 
    difference() {
        cylinder(d=4, h=5, $fn=20);
        translate([4,0,3]) 
        cube(7, center=true);
    }
    // NE556
    color([0.1,0.1,0.1])
    translate([5,-12,epaisseur_carte]) 
    cube(size=[10,20,9]);
    // Potar
    translate([-2.5,-15,epaisseur_carte])
    union() {
        color("blue")
        cube(size=[5,10,10.5]);
        color("gold")
        translate([2,2,10.5])
        cylinder(d=2.5, $fn=50);
    }
}
// main file
use <../library/elec-cartes/elec-cartes.scad>
use <../library/meca-comps/meca-comps.scad>

module vitesse(d_int=96,taille_plaque=130){
// support
color("white"){
    bague_pleine(d_int,20);
    translate([-5,-d_int/2,20])
    cube([10,d_int,taille_plaque]);
    translate([0,0,20+taille_plaque])
    bague_pleine(d_int,20);
}

// arduino
translate([5,25,100])
rotate([0,90,0])
arduino_uno();

// tube de pitot
translate([55,0,0]) 
bague_creuse(10,8,150);
translate([-55,0,0]) 
bague_creuse(10,8,150);

}

vitesse();
